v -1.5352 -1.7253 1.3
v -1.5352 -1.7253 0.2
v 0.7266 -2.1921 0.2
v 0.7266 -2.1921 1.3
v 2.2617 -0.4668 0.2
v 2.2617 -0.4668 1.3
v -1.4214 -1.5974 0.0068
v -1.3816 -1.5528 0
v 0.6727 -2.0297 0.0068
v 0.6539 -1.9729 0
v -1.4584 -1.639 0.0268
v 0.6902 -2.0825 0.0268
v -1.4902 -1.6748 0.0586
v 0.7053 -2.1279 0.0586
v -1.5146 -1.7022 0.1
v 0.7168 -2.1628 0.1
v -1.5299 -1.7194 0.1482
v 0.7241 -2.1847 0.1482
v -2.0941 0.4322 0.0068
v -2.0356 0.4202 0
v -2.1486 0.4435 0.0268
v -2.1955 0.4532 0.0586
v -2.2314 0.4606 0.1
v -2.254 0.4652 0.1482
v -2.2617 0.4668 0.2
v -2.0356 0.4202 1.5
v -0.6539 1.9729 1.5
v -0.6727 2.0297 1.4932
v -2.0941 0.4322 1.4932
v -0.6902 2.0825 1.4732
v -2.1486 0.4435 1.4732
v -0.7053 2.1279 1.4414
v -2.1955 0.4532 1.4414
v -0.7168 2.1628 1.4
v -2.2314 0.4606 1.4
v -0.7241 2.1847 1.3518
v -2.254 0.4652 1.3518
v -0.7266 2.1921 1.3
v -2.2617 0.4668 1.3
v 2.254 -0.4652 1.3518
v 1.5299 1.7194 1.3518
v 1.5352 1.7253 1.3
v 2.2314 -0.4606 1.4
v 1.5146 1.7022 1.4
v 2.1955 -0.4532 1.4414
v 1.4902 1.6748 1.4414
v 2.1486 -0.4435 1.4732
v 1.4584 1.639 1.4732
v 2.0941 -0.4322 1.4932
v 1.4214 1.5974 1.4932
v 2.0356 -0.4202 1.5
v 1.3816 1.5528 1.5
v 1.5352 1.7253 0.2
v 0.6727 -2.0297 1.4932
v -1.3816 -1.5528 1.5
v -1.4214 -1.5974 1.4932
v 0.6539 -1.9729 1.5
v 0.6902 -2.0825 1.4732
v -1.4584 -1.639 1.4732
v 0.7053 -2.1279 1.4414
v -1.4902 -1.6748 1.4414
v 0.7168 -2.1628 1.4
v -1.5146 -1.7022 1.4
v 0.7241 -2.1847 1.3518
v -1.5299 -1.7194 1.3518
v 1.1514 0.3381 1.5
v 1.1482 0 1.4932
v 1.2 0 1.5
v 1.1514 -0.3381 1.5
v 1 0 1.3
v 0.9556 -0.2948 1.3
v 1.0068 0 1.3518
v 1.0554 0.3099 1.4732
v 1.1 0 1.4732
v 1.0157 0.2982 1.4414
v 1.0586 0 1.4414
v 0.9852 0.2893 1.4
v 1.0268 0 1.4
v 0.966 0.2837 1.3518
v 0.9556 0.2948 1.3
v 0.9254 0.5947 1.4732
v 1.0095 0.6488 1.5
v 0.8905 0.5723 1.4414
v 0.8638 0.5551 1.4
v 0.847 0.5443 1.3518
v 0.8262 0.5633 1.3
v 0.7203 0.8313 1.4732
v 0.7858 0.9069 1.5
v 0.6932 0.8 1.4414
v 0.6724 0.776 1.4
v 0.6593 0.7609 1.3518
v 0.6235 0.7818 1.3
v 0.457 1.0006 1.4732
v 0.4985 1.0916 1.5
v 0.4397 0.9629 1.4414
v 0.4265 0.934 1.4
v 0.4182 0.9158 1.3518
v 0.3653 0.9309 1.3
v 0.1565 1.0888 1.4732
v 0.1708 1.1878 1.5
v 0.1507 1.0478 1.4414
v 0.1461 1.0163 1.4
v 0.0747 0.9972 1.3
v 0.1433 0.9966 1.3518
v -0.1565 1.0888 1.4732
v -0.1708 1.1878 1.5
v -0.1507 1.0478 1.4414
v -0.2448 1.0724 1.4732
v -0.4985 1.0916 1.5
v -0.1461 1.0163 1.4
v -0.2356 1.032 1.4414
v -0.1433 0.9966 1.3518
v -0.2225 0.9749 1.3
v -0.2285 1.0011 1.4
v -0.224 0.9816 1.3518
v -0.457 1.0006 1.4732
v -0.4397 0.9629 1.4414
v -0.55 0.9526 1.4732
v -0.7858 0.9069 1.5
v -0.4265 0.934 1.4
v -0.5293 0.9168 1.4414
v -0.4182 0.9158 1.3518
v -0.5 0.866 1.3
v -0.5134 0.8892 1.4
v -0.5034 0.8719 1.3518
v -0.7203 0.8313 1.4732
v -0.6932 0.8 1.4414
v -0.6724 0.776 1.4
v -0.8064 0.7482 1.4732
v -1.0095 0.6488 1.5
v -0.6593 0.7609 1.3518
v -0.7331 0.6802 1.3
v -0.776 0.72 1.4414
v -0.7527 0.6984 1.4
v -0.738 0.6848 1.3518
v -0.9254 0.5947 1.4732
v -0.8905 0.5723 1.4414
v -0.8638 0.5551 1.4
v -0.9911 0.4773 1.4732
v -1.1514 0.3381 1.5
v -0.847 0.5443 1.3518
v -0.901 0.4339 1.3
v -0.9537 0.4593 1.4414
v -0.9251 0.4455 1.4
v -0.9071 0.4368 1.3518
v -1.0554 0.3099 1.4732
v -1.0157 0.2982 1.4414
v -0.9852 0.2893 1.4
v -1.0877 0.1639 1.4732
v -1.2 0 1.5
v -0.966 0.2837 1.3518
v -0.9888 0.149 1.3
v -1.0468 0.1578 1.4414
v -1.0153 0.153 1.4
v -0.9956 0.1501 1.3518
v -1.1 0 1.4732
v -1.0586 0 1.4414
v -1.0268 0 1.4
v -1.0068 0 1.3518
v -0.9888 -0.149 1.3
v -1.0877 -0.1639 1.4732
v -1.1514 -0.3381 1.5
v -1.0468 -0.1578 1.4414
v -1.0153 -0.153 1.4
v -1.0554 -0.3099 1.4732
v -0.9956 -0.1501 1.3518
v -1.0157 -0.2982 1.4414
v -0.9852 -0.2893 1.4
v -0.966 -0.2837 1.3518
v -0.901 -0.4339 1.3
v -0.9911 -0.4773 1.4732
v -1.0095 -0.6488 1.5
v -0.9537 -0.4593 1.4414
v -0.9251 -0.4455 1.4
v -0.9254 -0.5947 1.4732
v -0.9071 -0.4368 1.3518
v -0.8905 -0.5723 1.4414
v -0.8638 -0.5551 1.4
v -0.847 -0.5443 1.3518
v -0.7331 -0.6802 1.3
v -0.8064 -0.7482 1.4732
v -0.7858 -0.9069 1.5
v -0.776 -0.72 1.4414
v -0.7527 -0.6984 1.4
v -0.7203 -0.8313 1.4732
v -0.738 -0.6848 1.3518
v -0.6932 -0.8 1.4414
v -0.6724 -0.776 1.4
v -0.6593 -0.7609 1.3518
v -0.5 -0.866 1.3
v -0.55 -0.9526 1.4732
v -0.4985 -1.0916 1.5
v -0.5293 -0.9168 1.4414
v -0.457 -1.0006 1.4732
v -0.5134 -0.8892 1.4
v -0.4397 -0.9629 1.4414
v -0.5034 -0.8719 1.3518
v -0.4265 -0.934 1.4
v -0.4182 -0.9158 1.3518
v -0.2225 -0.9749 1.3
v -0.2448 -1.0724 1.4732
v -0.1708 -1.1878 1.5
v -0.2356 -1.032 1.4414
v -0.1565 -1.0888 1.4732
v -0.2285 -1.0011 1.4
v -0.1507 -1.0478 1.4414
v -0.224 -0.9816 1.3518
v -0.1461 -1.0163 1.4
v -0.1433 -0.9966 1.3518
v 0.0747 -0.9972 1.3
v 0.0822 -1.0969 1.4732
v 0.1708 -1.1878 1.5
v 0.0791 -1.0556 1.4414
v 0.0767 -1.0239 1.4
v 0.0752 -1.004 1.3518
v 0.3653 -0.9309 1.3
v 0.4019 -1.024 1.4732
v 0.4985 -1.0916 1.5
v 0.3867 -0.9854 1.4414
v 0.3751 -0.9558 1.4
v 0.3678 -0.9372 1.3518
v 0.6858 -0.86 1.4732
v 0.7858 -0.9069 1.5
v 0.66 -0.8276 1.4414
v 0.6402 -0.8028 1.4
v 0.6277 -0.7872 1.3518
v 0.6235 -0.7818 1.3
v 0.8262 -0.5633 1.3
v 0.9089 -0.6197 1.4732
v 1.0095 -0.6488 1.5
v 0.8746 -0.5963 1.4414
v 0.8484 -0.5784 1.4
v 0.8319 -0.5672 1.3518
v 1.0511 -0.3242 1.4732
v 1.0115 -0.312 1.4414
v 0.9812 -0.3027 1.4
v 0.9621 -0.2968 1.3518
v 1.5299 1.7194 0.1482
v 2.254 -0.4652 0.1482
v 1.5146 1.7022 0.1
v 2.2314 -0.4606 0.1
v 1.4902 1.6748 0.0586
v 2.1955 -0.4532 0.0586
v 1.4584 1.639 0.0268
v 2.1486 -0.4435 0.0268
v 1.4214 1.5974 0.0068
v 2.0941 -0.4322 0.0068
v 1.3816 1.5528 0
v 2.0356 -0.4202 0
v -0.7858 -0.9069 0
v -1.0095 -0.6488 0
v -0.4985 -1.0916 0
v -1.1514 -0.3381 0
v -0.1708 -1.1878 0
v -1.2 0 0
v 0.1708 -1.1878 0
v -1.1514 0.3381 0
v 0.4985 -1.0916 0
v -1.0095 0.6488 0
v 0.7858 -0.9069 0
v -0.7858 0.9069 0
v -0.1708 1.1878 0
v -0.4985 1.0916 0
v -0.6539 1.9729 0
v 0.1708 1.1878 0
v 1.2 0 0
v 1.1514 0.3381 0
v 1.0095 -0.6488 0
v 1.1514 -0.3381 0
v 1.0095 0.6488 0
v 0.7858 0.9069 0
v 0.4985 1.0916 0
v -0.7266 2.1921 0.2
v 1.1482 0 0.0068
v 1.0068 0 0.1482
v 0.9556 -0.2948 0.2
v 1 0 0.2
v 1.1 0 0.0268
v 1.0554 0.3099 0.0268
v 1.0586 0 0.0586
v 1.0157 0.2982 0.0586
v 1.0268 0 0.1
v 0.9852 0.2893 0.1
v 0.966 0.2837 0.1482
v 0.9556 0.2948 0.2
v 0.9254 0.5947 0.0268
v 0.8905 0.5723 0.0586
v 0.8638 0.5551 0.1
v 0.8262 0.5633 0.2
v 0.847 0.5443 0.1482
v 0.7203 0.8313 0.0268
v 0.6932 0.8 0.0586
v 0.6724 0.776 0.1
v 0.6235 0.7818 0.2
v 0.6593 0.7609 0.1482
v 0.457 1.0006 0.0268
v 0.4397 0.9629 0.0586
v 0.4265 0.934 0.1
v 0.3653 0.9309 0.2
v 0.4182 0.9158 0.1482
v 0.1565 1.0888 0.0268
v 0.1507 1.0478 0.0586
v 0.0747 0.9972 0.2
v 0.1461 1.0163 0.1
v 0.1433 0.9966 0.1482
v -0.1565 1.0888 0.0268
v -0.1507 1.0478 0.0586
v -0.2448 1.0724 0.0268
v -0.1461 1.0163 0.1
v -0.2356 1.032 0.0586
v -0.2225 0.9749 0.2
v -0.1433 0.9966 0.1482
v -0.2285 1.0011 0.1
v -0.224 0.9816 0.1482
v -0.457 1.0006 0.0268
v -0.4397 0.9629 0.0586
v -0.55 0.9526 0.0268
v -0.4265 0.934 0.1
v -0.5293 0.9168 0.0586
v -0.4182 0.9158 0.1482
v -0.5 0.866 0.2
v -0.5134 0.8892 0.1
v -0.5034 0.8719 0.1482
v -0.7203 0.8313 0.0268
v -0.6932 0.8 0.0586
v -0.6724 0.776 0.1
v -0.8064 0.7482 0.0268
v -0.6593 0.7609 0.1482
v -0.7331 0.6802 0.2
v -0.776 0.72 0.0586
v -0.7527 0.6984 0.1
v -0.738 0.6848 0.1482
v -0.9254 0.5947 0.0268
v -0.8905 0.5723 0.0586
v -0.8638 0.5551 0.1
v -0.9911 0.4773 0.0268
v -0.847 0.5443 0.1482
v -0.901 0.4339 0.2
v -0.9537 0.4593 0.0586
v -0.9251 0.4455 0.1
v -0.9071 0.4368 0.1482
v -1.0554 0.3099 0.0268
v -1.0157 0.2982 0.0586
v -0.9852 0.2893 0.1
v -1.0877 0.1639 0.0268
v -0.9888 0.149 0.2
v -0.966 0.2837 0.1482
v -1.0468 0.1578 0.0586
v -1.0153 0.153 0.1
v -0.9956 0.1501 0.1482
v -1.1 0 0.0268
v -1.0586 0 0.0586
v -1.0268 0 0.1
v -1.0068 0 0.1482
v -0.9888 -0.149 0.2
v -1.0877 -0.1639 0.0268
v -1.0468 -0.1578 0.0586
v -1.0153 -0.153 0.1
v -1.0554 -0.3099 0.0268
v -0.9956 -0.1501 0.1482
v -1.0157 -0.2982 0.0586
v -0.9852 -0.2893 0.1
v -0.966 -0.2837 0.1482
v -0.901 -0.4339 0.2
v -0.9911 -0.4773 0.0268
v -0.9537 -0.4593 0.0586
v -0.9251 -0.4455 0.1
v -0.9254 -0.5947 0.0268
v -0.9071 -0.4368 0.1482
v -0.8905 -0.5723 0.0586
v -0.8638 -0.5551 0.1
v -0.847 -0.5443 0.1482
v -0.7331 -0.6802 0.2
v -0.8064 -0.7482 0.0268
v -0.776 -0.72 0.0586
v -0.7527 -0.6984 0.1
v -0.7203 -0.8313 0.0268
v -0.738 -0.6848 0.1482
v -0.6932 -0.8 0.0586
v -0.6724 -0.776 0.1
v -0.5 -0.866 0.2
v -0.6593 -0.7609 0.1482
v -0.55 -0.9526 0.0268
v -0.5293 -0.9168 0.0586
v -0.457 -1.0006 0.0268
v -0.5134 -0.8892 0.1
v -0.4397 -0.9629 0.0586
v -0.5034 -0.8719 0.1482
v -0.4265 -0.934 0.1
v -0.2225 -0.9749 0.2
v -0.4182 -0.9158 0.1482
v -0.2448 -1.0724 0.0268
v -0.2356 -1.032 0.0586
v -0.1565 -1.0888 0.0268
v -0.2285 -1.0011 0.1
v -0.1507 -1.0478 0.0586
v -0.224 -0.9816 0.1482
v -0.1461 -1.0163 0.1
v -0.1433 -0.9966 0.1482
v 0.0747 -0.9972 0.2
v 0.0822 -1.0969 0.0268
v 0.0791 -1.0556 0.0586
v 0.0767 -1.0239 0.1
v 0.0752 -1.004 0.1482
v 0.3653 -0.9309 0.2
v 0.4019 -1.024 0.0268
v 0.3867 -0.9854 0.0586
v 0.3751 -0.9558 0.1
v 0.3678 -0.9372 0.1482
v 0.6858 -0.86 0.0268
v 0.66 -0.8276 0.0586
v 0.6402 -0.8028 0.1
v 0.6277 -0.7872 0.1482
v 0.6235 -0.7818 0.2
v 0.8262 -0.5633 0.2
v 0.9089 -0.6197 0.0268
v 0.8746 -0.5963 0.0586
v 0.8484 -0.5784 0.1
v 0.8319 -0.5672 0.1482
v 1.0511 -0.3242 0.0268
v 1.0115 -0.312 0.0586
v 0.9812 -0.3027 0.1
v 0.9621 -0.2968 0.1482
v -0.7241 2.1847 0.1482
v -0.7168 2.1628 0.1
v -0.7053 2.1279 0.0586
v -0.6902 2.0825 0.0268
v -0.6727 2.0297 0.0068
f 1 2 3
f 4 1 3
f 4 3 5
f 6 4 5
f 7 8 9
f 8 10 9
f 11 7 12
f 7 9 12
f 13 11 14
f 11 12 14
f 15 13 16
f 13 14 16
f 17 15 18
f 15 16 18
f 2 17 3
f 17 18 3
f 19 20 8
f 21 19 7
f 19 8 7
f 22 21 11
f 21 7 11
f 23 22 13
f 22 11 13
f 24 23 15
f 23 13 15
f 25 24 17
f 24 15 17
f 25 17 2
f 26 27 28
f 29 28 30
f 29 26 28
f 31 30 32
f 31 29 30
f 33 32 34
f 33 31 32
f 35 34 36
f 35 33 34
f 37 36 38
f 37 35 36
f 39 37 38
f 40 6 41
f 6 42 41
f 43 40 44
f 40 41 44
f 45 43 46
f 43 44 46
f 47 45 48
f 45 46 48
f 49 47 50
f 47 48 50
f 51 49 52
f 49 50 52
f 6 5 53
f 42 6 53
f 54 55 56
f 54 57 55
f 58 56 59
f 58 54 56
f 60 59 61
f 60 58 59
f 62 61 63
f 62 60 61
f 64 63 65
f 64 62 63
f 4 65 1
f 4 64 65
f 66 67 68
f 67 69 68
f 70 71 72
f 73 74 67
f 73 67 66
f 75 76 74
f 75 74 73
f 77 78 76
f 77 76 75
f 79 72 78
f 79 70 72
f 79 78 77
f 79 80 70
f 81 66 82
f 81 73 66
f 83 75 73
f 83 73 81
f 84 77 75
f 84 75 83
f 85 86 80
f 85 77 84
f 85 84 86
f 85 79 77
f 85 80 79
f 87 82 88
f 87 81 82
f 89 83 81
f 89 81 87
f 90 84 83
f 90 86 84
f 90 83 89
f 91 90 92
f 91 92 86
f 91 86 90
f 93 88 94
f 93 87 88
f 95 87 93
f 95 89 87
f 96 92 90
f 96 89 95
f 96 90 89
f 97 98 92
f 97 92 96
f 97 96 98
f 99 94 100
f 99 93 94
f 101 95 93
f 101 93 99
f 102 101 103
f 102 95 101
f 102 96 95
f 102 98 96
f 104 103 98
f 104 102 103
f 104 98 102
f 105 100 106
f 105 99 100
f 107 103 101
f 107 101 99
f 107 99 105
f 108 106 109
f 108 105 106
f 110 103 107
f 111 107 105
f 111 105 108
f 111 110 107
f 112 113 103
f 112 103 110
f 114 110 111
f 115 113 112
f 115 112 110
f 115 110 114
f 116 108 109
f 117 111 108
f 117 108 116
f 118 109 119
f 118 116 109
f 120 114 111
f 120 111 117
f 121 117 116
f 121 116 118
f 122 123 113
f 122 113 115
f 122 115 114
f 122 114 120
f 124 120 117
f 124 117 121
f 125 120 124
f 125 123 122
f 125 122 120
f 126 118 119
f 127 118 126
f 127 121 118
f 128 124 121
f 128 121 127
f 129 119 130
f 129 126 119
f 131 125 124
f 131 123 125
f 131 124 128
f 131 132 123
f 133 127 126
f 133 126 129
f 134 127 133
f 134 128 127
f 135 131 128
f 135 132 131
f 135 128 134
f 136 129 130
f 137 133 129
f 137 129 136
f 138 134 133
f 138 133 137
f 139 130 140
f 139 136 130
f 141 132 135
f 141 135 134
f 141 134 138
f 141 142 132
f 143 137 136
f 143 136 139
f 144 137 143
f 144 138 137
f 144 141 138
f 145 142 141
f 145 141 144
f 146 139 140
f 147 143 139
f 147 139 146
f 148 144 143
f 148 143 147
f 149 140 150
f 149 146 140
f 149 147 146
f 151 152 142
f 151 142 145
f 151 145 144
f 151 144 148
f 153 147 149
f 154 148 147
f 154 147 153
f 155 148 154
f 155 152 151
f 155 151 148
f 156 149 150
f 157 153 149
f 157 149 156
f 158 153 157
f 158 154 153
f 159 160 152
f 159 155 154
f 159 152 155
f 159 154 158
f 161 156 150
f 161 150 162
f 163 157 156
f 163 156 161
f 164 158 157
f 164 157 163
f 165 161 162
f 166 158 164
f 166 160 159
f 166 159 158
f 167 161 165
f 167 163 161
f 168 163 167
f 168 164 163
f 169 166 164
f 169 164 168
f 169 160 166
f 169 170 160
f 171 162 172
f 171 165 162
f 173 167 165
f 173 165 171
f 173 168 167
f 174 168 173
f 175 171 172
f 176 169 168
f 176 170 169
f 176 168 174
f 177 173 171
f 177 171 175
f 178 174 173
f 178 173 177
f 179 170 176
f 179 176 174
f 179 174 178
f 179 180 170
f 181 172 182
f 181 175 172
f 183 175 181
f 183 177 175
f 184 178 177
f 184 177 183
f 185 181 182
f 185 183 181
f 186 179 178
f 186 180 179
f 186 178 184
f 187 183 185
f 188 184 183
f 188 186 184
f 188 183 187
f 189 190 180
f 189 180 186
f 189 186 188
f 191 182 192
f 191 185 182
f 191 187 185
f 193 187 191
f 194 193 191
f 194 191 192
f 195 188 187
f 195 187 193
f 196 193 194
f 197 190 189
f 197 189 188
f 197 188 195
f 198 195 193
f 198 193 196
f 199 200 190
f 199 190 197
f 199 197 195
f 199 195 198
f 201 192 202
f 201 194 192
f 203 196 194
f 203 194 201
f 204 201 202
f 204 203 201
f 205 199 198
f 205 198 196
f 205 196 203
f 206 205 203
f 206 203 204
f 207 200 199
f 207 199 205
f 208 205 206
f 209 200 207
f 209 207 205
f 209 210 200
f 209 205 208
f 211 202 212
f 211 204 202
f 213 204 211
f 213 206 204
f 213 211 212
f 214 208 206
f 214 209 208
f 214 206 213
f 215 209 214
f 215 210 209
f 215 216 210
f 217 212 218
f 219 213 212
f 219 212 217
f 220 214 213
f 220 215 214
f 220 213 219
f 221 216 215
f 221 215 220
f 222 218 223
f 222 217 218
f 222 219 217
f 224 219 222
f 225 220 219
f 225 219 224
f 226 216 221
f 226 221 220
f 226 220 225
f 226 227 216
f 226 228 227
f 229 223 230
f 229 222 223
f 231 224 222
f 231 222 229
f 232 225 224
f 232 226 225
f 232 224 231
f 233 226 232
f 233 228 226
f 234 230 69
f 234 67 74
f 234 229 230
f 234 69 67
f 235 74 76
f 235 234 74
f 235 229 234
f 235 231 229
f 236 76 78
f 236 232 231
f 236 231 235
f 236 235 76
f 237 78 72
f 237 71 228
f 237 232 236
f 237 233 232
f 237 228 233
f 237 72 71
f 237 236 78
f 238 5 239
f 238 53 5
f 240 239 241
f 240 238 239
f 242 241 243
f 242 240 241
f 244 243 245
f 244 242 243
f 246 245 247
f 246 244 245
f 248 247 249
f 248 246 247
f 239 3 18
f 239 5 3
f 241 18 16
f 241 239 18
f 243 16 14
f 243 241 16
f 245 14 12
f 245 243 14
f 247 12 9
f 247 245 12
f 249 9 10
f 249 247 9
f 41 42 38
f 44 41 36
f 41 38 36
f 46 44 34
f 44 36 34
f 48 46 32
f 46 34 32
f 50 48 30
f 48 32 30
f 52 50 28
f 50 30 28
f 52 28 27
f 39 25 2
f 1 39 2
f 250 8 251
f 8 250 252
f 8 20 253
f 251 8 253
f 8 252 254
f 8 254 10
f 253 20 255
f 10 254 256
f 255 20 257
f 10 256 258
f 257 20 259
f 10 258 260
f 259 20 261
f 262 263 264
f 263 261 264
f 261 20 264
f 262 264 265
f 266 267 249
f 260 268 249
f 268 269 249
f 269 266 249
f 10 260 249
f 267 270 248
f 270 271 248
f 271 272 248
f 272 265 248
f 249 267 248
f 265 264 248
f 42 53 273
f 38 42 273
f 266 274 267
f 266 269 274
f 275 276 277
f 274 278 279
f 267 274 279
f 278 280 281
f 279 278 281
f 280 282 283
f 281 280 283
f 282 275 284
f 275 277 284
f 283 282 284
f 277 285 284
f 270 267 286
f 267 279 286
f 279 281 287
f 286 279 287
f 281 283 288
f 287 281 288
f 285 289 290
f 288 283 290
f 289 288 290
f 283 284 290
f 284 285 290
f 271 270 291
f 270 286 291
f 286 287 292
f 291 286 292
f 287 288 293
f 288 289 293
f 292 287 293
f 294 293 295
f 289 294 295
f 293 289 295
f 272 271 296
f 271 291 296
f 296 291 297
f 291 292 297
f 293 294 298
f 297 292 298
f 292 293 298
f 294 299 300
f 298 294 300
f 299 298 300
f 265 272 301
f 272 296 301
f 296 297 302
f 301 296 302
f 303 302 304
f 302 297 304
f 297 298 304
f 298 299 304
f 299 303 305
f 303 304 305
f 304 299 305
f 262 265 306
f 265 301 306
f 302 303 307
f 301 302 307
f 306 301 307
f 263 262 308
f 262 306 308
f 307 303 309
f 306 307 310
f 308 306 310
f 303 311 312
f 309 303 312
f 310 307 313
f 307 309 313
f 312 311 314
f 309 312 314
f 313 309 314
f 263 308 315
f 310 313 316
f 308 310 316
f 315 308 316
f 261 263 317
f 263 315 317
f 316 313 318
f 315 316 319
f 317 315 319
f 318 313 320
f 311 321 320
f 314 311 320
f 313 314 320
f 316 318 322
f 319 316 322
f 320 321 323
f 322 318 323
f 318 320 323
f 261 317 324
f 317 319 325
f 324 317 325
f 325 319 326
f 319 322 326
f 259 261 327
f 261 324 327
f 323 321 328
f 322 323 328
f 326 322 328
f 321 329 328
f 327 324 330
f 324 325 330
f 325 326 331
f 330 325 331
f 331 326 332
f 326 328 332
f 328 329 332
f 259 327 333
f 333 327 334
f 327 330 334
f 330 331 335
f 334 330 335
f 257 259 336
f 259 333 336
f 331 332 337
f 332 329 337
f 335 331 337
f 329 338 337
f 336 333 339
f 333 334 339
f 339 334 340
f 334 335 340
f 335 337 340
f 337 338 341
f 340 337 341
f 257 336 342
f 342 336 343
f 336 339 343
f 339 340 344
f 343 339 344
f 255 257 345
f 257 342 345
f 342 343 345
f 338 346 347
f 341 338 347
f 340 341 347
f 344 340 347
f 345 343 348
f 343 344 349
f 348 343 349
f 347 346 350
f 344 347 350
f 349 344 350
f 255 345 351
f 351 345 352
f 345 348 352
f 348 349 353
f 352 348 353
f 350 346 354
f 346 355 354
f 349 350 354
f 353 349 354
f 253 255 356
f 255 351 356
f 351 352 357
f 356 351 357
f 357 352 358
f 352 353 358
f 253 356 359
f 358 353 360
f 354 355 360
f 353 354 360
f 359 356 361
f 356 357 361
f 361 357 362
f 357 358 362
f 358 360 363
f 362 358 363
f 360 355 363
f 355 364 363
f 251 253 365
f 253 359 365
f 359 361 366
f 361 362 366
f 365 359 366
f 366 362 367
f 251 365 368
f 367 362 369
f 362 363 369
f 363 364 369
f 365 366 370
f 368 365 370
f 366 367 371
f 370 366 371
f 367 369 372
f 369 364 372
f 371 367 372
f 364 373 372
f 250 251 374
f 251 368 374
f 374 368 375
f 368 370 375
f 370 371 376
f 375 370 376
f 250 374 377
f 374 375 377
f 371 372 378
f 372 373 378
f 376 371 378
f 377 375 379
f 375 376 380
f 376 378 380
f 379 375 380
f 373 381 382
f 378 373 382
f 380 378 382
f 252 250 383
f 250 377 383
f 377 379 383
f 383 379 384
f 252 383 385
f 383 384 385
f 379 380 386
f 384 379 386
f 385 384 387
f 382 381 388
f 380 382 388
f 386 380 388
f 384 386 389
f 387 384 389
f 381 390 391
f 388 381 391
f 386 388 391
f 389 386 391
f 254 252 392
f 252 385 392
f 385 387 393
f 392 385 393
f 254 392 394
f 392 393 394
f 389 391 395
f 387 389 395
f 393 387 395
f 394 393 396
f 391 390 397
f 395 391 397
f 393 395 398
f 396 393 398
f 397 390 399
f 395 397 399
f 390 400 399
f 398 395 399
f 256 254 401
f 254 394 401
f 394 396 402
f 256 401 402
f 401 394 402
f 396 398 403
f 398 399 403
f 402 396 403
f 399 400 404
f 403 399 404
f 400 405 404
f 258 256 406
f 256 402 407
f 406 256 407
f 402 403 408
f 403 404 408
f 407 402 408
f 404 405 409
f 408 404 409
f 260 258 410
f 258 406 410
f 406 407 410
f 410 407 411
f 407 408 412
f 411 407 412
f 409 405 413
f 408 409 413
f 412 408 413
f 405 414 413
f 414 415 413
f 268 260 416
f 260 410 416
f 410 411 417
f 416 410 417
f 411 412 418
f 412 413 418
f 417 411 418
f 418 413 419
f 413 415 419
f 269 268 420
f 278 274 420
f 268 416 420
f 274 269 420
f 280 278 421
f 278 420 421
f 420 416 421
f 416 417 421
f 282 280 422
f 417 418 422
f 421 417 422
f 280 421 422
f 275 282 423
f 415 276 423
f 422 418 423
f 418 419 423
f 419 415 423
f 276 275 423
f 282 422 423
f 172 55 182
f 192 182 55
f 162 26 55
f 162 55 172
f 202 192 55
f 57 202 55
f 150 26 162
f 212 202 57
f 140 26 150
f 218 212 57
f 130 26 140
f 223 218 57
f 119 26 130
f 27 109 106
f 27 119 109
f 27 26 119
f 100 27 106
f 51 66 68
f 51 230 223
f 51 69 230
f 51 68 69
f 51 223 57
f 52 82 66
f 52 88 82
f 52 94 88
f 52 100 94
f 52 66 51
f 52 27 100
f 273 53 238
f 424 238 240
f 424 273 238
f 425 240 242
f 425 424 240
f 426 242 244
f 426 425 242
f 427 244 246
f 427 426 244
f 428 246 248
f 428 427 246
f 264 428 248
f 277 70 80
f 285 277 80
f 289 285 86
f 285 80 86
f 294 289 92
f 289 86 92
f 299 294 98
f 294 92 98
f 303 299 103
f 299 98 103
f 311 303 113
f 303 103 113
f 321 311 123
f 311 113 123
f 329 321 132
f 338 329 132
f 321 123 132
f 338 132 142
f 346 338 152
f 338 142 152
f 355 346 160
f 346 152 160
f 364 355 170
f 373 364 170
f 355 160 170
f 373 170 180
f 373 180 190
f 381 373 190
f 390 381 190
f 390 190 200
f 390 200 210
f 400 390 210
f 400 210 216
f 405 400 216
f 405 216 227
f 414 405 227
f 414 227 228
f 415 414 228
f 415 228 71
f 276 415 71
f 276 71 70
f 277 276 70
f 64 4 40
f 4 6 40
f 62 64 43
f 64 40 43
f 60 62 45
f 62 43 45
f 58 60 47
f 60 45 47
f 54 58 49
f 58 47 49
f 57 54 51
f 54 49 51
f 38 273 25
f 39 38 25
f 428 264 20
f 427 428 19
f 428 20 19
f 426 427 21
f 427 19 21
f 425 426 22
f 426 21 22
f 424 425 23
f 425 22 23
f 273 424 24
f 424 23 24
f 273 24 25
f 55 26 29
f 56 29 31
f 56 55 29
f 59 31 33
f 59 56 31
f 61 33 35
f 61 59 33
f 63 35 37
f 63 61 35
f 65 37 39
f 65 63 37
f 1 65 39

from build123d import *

# Parameters (mm, degrees)
F1_DEPTH = 1.5
F2_R     = 1
F3_DEPTH = 25
F4_R     = 0.2


with BuildPart() as f1:
    # F0 (on Top) → F1 (new body)
    with BuildSketch(Plane.XY):
        Polygon((2.2617237946, -0.4668391698), (1.5351564778, 1.7252906776), (-0.7265673168, 2.1921298473), (-2.2617237946, 0.4668391698), (-1.5351564778, -1.7252906776), (0.7265673168, -2.1921298473), align=None)
    extrude(amount=F1_DEPTH)

    # F2 (on face) → F3 (cut)
    with BuildSketch(Plane.XY.offset(1.5)):
        Circle(F2_R)
    extrude(amount=-F3_DEPTH, mode=Mode.SUBTRACT)

    # F4
    f4_edges = [f1.edges().sort_by_distance(p)[0] for p in [
        (-1, 0, 1.5),
        (1.494146, -1.329485, 1.5),
        (-0.404295, -1.95871, 1.5),
        (1.89844, 0.629226, 1.5),
        (-1.89844, -0.629226, 1.5),
        (0.404295, 1.95871, 1.5),
        (-1.494146, 1.329485, 1.5),
        (1.494146, -1.329485, 0),
        (-0.404295, -1.95871, 0),
        (1.89844, 0.629226, 0),
        (-1.89844, -0.629226, 0),
        (0.404295, 1.95871, 0),
        (-1.494146, 1.329485, 0),
        (-1, 0, 0),
    ]]
    fillet(f4_edges, radius=F4_R)


solid = f1.part
